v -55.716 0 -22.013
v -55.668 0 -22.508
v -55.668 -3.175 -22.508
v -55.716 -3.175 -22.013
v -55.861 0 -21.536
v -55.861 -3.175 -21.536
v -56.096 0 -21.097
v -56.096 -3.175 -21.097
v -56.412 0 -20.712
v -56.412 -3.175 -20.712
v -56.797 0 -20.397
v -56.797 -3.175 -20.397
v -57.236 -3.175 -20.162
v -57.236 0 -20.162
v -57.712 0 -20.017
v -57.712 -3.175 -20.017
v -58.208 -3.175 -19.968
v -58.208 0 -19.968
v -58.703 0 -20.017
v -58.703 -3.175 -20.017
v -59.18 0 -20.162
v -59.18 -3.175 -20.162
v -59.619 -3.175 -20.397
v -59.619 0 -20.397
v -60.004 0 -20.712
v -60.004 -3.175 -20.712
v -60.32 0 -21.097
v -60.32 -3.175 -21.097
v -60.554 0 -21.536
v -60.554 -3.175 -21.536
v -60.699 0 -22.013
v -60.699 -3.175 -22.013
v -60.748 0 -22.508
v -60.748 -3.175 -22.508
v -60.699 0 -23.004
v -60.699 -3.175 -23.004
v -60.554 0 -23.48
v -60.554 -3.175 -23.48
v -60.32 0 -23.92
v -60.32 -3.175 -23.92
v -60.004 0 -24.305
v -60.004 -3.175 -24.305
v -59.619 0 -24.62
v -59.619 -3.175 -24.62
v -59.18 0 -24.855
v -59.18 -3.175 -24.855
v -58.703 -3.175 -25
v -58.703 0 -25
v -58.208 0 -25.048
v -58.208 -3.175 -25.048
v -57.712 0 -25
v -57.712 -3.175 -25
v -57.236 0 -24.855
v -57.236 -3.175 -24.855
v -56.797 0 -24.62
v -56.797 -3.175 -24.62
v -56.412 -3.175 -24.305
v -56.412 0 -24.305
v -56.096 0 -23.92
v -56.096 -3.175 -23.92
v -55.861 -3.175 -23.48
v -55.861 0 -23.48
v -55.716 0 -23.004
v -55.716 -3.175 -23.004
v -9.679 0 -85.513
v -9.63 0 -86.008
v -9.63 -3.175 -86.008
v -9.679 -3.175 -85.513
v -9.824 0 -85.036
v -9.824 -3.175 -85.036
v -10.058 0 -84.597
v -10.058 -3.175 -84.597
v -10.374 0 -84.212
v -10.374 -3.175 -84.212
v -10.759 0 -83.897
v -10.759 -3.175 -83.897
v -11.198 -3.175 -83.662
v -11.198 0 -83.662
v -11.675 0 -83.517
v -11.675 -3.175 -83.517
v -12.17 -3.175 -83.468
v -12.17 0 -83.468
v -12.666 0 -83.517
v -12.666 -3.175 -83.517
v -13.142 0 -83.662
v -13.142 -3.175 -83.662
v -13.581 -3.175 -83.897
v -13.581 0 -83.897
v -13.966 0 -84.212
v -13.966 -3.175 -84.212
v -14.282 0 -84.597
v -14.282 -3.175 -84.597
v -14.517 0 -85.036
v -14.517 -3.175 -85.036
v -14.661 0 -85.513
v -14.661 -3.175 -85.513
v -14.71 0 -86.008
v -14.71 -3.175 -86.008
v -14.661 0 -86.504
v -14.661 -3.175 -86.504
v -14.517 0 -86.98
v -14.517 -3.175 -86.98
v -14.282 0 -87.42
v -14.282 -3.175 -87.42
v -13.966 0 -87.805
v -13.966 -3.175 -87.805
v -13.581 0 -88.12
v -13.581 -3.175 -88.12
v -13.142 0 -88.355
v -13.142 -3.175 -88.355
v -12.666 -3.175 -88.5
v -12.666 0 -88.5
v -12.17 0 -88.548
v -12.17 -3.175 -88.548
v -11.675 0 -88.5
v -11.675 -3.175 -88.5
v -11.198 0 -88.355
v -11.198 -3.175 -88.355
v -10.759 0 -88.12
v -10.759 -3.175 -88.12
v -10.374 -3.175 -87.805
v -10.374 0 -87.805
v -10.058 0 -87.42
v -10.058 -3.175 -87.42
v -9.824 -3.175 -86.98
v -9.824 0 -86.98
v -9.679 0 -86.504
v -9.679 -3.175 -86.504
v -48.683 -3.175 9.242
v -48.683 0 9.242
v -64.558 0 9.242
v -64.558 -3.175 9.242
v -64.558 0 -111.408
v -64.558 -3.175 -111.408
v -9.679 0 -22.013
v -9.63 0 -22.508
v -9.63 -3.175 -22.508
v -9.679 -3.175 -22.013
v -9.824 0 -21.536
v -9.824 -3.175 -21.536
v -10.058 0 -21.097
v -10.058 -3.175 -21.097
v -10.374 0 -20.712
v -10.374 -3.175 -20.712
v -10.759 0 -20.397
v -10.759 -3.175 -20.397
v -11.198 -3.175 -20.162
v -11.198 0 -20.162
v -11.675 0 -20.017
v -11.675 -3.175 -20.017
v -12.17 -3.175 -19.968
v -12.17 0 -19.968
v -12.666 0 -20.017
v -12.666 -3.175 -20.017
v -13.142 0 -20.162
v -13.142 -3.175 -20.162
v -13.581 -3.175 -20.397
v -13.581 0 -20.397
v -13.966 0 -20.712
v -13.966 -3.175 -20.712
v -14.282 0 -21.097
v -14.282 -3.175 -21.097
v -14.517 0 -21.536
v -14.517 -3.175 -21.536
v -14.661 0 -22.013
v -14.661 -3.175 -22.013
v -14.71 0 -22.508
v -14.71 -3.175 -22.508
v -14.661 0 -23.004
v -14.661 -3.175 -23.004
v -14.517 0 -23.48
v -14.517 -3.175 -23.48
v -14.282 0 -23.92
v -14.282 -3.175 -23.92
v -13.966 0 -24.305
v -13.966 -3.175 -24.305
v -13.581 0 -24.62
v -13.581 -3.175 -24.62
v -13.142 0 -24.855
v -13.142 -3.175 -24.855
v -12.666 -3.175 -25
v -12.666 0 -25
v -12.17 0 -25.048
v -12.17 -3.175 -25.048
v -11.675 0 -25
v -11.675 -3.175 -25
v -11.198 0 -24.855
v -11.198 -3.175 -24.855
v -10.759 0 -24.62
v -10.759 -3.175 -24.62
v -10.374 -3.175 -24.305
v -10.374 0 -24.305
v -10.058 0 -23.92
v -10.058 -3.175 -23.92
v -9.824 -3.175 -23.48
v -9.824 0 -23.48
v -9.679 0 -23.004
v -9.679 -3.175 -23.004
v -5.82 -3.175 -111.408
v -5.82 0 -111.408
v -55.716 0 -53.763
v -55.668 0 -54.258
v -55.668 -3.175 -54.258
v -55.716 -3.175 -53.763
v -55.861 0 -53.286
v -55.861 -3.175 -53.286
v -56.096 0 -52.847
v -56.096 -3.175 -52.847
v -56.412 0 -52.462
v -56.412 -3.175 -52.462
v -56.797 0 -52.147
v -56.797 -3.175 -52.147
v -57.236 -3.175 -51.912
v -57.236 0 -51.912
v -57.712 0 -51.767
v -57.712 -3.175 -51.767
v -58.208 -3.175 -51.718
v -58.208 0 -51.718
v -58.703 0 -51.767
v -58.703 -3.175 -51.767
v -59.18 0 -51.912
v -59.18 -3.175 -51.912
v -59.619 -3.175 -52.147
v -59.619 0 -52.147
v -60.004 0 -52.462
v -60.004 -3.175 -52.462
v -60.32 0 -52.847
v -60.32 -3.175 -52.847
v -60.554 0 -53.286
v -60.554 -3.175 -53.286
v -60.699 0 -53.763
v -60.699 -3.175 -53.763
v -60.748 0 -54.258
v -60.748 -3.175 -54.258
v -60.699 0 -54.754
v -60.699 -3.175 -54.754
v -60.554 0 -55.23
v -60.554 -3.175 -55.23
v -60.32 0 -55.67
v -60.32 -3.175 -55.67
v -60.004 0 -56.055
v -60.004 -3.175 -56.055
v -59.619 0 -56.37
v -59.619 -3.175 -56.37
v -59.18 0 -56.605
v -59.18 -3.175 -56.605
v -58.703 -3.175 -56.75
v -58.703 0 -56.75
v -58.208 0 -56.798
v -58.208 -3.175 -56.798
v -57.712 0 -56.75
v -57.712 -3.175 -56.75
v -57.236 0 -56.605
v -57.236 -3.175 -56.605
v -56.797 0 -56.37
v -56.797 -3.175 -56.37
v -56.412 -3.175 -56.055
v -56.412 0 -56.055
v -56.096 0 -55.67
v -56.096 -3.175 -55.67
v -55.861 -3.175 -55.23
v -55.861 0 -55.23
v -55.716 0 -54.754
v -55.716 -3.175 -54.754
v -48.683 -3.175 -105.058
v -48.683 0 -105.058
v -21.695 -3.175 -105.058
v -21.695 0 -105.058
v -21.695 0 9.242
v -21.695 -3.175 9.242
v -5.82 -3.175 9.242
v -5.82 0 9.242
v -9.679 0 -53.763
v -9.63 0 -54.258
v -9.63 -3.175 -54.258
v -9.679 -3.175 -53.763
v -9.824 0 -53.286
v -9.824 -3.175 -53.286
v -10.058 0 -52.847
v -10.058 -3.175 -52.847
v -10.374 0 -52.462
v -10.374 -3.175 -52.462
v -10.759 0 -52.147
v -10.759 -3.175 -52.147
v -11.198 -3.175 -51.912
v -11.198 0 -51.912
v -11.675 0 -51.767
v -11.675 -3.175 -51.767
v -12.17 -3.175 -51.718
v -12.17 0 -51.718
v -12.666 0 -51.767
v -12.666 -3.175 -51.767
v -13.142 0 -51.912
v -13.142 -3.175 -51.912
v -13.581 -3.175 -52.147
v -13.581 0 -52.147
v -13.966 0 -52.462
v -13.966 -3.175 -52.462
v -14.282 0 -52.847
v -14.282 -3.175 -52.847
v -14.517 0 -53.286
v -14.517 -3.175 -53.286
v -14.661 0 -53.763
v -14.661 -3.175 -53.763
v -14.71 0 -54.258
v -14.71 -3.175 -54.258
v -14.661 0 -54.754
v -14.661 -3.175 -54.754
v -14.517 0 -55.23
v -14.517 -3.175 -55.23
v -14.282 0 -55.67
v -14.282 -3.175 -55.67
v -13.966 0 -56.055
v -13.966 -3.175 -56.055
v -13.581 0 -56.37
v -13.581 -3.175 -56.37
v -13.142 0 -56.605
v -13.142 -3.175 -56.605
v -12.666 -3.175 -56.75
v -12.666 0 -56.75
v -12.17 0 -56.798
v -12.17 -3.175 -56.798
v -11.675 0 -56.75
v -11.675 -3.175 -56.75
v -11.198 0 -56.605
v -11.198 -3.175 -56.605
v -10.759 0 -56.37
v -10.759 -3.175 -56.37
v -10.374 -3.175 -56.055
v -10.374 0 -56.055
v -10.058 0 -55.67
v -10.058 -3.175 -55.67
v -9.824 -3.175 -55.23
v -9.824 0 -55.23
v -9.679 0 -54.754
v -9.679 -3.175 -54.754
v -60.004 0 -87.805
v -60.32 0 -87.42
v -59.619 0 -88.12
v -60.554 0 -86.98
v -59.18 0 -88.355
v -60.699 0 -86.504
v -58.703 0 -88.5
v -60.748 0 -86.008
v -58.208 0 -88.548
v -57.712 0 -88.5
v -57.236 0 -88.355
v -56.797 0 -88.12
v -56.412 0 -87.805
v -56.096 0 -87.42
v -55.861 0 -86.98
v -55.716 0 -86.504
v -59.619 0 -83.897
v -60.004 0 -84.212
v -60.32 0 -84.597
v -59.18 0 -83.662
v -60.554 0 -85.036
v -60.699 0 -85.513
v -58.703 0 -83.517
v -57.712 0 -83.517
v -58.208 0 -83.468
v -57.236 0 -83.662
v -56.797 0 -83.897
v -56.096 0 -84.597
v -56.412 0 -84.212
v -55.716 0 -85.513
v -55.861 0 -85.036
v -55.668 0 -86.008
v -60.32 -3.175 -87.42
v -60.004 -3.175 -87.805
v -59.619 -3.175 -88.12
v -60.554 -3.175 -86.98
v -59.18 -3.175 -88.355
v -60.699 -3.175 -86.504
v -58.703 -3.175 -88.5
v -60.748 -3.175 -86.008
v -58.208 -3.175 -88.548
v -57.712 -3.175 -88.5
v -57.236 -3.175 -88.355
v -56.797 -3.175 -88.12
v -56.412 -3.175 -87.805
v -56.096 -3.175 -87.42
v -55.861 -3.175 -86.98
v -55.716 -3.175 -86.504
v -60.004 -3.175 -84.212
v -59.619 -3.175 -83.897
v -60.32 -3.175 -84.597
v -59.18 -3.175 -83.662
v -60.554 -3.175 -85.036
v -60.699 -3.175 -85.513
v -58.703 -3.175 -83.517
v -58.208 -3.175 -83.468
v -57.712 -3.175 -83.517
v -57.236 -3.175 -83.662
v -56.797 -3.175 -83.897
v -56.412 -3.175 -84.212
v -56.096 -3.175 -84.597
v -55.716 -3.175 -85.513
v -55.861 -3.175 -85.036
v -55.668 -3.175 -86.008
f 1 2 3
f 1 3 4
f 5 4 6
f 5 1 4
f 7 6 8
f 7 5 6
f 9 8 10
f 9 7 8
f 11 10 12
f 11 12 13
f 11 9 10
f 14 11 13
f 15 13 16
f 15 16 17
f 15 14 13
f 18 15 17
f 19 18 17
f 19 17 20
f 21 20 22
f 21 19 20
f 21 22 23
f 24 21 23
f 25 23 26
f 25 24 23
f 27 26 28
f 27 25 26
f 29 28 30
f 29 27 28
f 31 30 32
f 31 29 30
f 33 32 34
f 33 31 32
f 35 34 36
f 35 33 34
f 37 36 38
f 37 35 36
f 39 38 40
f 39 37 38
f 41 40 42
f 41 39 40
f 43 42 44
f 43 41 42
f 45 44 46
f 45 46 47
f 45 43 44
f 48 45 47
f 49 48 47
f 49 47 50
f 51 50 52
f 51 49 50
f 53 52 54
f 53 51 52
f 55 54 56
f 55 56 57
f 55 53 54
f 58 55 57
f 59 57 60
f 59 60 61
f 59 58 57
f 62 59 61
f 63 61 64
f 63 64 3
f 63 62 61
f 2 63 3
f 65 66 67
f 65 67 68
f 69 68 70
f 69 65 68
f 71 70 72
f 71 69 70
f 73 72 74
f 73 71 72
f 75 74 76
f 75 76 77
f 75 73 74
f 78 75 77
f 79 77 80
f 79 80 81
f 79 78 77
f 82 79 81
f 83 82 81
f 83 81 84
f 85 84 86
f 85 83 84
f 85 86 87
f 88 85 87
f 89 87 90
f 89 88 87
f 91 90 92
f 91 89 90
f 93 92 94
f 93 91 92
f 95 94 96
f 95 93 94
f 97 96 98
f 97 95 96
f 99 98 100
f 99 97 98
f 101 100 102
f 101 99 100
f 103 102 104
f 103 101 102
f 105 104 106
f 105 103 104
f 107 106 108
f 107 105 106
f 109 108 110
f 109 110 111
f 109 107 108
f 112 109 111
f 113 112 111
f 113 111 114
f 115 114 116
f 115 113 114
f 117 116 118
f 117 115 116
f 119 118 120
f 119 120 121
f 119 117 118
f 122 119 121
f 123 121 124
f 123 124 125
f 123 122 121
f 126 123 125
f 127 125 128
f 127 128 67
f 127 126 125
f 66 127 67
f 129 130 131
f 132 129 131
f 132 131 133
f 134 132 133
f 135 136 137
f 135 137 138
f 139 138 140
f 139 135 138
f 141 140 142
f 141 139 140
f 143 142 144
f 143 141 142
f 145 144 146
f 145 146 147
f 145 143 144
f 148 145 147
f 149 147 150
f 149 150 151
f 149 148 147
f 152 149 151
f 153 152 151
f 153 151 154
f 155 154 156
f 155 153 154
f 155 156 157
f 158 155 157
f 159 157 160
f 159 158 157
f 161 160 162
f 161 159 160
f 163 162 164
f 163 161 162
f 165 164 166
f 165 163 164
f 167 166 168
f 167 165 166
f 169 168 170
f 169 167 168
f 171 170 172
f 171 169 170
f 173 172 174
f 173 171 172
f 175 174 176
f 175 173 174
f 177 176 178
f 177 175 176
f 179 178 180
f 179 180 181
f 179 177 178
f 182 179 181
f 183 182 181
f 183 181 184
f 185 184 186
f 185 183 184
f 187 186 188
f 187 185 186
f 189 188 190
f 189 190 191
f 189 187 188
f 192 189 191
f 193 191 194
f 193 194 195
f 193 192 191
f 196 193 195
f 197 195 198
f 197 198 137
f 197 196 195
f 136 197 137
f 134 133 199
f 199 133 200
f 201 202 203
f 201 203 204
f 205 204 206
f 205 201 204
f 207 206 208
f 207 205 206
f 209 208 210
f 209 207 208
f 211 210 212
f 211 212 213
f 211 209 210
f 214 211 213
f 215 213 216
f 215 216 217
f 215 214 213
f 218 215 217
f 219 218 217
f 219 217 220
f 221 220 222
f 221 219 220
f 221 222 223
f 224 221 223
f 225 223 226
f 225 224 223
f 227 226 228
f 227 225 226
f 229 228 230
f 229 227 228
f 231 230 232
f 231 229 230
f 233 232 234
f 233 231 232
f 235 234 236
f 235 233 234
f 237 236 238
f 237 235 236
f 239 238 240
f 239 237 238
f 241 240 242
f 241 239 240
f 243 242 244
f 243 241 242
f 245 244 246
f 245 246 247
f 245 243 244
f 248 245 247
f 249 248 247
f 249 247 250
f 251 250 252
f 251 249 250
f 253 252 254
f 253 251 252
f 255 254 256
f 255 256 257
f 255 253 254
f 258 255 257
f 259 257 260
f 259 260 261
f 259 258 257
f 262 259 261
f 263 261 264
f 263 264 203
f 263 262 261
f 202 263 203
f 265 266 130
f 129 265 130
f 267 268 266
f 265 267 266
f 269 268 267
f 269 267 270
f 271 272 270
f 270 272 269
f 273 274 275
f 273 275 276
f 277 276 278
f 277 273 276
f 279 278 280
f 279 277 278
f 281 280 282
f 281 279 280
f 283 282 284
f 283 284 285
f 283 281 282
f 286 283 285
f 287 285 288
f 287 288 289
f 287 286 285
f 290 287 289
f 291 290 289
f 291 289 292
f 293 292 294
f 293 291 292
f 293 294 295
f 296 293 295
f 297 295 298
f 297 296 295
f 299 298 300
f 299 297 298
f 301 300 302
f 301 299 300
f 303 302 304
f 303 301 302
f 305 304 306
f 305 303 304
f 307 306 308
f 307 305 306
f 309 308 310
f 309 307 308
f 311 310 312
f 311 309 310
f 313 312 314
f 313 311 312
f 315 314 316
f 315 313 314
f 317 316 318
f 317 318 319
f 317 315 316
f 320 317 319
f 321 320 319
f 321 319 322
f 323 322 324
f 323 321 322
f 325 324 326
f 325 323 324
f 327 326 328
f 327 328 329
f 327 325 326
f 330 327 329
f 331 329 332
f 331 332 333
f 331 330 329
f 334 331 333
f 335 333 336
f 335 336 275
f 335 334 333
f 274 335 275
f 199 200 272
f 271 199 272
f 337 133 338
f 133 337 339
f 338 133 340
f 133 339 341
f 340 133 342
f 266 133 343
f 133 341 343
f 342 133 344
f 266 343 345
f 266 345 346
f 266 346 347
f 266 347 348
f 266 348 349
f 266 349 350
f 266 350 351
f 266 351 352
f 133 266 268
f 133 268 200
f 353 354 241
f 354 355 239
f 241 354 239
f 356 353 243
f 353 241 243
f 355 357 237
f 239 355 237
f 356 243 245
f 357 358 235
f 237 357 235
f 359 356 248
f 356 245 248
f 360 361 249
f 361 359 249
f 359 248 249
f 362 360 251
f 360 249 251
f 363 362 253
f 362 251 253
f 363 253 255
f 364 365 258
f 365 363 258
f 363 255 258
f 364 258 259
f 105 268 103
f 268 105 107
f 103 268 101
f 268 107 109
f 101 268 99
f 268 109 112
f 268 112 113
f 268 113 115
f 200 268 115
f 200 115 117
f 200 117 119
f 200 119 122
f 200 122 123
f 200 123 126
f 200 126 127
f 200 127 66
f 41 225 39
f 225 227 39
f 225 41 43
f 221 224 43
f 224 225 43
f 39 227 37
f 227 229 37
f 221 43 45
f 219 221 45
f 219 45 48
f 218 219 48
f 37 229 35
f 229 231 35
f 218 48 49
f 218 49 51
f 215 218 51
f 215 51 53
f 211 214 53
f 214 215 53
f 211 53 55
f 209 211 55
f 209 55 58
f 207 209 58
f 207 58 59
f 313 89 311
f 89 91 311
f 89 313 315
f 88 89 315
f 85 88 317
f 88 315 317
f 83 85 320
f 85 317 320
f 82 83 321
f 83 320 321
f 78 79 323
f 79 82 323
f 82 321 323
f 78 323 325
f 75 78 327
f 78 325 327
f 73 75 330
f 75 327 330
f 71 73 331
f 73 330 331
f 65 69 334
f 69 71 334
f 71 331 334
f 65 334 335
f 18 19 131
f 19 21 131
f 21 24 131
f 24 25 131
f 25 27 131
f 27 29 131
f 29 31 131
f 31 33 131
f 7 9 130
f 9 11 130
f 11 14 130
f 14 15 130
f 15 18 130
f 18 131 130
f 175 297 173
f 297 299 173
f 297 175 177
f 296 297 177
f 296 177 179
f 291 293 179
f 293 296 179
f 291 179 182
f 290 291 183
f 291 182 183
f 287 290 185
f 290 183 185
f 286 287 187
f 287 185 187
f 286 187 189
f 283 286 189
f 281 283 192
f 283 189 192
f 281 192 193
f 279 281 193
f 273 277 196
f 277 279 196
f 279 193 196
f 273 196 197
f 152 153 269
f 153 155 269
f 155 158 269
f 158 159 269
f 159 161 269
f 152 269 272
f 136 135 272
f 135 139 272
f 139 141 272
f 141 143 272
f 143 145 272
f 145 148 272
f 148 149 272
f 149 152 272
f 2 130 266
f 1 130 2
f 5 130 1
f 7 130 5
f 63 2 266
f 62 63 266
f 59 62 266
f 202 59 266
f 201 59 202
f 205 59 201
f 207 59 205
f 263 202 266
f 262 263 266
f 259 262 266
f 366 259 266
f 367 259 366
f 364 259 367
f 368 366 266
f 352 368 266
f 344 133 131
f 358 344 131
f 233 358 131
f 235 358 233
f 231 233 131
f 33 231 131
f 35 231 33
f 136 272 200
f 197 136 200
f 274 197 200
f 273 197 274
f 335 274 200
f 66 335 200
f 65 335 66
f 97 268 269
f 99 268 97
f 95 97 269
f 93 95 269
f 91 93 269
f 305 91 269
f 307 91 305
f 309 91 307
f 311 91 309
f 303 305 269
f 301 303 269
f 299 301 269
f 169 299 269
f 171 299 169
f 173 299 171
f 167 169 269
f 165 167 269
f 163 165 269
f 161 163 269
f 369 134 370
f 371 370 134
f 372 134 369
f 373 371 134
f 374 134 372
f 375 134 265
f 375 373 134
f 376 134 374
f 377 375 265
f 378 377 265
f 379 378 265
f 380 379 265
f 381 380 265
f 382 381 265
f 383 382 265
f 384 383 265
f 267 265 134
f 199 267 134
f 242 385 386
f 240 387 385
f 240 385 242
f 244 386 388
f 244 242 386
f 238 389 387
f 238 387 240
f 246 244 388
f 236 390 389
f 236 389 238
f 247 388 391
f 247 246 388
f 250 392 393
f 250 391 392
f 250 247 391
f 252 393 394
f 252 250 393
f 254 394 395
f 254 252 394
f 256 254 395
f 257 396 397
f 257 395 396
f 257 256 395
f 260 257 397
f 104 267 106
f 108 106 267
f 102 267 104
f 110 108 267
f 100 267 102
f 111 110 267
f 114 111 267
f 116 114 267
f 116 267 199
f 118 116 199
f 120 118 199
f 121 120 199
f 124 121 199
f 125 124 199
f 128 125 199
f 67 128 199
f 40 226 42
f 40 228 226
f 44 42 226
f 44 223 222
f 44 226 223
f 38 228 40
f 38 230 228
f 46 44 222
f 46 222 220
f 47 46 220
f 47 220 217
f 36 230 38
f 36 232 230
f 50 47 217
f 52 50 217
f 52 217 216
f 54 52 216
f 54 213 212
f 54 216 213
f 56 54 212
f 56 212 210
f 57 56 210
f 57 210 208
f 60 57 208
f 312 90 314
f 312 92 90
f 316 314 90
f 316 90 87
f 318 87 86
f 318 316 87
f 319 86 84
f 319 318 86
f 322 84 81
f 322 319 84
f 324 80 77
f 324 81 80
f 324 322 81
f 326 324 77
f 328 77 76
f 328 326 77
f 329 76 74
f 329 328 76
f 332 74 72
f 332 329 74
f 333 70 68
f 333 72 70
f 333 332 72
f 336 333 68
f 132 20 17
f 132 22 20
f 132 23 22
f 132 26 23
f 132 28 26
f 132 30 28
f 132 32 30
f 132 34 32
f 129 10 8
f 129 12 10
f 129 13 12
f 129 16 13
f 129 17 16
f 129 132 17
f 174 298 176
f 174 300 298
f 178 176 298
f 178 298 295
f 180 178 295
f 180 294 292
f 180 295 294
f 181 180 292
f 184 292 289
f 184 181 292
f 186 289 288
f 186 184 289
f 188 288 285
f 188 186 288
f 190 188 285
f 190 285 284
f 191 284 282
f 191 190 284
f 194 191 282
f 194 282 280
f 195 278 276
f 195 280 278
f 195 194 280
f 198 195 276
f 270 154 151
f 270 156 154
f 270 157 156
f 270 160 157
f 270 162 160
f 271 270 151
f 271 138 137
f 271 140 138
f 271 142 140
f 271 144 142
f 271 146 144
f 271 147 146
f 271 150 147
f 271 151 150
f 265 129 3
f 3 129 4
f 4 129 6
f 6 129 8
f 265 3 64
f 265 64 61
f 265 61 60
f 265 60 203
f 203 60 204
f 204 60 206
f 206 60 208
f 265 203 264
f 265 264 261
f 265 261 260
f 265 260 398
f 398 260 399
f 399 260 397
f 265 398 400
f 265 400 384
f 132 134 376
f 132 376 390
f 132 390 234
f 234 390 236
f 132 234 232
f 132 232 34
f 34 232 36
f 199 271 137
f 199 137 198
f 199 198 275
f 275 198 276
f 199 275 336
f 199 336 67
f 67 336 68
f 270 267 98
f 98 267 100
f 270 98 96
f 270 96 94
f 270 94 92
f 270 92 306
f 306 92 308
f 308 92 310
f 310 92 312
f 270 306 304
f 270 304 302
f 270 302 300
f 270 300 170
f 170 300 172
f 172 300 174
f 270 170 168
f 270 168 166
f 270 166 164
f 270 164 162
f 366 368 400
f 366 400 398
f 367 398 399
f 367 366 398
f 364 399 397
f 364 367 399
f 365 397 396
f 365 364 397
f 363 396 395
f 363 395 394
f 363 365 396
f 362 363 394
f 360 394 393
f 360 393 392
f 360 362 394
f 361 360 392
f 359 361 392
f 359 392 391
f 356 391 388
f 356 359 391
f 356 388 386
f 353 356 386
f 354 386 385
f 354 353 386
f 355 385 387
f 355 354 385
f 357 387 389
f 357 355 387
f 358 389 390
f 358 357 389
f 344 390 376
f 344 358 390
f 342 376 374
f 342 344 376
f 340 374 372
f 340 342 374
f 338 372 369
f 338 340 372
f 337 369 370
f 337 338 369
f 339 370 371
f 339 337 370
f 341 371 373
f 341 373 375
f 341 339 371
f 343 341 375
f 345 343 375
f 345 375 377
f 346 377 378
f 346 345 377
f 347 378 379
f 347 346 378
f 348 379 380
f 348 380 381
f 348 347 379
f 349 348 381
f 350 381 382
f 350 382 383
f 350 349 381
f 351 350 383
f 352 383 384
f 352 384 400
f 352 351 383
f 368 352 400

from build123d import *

# Parameters (mm, degrees)
F0_W     = 3.175
F0_H     = 114.3
F0_R     = 2.54
F1_DEPTH = 3.175


with BuildPart() as f1:
    # F0 (on Front) → F1 (new body)
    with BuildSketch(Plane.XZ):
        with Locations((-50.270172, -47.908469)):
            Rectangle(F0_W, F0_H)
        Polygon((-21.695172, -105.058469), (-48.682672, -105.058469), (-51.857672, -105.058469), (-51.857672, 9.241531), (-64.557672, 9.241531), (-64.557672, -111.408469), (-5.820172, -111.408469), (-5.820172, 9.241531), (-18.520172, 9.241531), (-18.520172, -105.058469), align=None)
        with Locations((-58.207672, -86.008469)):
            Circle(F0_R, mode=Mode.SUBTRACT)
        with Locations((-58.207672, -54.258469)):
            Circle(F0_R, mode=Mode.SUBTRACT)
        with Locations((-12.170172, -86.008469)):
            Circle(F0_R, mode=Mode.SUBTRACT)
        with Locations((-12.170172, -54.258469)):
            Circle(F0_R, mode=Mode.SUBTRACT)
        with Locations((-58.207672, -22.508469)):
            Circle(F0_R, mode=Mode.SUBTRACT)
        with Locations((-12.170172, -22.508469)):
            Circle(F0_R, mode=Mode.SUBTRACT)
        with Locations((-20.107672, -47.908469)):
            Rectangle(F0_W, F0_H)
    extrude(amount=F1_DEPTH)


solid = f1.part
